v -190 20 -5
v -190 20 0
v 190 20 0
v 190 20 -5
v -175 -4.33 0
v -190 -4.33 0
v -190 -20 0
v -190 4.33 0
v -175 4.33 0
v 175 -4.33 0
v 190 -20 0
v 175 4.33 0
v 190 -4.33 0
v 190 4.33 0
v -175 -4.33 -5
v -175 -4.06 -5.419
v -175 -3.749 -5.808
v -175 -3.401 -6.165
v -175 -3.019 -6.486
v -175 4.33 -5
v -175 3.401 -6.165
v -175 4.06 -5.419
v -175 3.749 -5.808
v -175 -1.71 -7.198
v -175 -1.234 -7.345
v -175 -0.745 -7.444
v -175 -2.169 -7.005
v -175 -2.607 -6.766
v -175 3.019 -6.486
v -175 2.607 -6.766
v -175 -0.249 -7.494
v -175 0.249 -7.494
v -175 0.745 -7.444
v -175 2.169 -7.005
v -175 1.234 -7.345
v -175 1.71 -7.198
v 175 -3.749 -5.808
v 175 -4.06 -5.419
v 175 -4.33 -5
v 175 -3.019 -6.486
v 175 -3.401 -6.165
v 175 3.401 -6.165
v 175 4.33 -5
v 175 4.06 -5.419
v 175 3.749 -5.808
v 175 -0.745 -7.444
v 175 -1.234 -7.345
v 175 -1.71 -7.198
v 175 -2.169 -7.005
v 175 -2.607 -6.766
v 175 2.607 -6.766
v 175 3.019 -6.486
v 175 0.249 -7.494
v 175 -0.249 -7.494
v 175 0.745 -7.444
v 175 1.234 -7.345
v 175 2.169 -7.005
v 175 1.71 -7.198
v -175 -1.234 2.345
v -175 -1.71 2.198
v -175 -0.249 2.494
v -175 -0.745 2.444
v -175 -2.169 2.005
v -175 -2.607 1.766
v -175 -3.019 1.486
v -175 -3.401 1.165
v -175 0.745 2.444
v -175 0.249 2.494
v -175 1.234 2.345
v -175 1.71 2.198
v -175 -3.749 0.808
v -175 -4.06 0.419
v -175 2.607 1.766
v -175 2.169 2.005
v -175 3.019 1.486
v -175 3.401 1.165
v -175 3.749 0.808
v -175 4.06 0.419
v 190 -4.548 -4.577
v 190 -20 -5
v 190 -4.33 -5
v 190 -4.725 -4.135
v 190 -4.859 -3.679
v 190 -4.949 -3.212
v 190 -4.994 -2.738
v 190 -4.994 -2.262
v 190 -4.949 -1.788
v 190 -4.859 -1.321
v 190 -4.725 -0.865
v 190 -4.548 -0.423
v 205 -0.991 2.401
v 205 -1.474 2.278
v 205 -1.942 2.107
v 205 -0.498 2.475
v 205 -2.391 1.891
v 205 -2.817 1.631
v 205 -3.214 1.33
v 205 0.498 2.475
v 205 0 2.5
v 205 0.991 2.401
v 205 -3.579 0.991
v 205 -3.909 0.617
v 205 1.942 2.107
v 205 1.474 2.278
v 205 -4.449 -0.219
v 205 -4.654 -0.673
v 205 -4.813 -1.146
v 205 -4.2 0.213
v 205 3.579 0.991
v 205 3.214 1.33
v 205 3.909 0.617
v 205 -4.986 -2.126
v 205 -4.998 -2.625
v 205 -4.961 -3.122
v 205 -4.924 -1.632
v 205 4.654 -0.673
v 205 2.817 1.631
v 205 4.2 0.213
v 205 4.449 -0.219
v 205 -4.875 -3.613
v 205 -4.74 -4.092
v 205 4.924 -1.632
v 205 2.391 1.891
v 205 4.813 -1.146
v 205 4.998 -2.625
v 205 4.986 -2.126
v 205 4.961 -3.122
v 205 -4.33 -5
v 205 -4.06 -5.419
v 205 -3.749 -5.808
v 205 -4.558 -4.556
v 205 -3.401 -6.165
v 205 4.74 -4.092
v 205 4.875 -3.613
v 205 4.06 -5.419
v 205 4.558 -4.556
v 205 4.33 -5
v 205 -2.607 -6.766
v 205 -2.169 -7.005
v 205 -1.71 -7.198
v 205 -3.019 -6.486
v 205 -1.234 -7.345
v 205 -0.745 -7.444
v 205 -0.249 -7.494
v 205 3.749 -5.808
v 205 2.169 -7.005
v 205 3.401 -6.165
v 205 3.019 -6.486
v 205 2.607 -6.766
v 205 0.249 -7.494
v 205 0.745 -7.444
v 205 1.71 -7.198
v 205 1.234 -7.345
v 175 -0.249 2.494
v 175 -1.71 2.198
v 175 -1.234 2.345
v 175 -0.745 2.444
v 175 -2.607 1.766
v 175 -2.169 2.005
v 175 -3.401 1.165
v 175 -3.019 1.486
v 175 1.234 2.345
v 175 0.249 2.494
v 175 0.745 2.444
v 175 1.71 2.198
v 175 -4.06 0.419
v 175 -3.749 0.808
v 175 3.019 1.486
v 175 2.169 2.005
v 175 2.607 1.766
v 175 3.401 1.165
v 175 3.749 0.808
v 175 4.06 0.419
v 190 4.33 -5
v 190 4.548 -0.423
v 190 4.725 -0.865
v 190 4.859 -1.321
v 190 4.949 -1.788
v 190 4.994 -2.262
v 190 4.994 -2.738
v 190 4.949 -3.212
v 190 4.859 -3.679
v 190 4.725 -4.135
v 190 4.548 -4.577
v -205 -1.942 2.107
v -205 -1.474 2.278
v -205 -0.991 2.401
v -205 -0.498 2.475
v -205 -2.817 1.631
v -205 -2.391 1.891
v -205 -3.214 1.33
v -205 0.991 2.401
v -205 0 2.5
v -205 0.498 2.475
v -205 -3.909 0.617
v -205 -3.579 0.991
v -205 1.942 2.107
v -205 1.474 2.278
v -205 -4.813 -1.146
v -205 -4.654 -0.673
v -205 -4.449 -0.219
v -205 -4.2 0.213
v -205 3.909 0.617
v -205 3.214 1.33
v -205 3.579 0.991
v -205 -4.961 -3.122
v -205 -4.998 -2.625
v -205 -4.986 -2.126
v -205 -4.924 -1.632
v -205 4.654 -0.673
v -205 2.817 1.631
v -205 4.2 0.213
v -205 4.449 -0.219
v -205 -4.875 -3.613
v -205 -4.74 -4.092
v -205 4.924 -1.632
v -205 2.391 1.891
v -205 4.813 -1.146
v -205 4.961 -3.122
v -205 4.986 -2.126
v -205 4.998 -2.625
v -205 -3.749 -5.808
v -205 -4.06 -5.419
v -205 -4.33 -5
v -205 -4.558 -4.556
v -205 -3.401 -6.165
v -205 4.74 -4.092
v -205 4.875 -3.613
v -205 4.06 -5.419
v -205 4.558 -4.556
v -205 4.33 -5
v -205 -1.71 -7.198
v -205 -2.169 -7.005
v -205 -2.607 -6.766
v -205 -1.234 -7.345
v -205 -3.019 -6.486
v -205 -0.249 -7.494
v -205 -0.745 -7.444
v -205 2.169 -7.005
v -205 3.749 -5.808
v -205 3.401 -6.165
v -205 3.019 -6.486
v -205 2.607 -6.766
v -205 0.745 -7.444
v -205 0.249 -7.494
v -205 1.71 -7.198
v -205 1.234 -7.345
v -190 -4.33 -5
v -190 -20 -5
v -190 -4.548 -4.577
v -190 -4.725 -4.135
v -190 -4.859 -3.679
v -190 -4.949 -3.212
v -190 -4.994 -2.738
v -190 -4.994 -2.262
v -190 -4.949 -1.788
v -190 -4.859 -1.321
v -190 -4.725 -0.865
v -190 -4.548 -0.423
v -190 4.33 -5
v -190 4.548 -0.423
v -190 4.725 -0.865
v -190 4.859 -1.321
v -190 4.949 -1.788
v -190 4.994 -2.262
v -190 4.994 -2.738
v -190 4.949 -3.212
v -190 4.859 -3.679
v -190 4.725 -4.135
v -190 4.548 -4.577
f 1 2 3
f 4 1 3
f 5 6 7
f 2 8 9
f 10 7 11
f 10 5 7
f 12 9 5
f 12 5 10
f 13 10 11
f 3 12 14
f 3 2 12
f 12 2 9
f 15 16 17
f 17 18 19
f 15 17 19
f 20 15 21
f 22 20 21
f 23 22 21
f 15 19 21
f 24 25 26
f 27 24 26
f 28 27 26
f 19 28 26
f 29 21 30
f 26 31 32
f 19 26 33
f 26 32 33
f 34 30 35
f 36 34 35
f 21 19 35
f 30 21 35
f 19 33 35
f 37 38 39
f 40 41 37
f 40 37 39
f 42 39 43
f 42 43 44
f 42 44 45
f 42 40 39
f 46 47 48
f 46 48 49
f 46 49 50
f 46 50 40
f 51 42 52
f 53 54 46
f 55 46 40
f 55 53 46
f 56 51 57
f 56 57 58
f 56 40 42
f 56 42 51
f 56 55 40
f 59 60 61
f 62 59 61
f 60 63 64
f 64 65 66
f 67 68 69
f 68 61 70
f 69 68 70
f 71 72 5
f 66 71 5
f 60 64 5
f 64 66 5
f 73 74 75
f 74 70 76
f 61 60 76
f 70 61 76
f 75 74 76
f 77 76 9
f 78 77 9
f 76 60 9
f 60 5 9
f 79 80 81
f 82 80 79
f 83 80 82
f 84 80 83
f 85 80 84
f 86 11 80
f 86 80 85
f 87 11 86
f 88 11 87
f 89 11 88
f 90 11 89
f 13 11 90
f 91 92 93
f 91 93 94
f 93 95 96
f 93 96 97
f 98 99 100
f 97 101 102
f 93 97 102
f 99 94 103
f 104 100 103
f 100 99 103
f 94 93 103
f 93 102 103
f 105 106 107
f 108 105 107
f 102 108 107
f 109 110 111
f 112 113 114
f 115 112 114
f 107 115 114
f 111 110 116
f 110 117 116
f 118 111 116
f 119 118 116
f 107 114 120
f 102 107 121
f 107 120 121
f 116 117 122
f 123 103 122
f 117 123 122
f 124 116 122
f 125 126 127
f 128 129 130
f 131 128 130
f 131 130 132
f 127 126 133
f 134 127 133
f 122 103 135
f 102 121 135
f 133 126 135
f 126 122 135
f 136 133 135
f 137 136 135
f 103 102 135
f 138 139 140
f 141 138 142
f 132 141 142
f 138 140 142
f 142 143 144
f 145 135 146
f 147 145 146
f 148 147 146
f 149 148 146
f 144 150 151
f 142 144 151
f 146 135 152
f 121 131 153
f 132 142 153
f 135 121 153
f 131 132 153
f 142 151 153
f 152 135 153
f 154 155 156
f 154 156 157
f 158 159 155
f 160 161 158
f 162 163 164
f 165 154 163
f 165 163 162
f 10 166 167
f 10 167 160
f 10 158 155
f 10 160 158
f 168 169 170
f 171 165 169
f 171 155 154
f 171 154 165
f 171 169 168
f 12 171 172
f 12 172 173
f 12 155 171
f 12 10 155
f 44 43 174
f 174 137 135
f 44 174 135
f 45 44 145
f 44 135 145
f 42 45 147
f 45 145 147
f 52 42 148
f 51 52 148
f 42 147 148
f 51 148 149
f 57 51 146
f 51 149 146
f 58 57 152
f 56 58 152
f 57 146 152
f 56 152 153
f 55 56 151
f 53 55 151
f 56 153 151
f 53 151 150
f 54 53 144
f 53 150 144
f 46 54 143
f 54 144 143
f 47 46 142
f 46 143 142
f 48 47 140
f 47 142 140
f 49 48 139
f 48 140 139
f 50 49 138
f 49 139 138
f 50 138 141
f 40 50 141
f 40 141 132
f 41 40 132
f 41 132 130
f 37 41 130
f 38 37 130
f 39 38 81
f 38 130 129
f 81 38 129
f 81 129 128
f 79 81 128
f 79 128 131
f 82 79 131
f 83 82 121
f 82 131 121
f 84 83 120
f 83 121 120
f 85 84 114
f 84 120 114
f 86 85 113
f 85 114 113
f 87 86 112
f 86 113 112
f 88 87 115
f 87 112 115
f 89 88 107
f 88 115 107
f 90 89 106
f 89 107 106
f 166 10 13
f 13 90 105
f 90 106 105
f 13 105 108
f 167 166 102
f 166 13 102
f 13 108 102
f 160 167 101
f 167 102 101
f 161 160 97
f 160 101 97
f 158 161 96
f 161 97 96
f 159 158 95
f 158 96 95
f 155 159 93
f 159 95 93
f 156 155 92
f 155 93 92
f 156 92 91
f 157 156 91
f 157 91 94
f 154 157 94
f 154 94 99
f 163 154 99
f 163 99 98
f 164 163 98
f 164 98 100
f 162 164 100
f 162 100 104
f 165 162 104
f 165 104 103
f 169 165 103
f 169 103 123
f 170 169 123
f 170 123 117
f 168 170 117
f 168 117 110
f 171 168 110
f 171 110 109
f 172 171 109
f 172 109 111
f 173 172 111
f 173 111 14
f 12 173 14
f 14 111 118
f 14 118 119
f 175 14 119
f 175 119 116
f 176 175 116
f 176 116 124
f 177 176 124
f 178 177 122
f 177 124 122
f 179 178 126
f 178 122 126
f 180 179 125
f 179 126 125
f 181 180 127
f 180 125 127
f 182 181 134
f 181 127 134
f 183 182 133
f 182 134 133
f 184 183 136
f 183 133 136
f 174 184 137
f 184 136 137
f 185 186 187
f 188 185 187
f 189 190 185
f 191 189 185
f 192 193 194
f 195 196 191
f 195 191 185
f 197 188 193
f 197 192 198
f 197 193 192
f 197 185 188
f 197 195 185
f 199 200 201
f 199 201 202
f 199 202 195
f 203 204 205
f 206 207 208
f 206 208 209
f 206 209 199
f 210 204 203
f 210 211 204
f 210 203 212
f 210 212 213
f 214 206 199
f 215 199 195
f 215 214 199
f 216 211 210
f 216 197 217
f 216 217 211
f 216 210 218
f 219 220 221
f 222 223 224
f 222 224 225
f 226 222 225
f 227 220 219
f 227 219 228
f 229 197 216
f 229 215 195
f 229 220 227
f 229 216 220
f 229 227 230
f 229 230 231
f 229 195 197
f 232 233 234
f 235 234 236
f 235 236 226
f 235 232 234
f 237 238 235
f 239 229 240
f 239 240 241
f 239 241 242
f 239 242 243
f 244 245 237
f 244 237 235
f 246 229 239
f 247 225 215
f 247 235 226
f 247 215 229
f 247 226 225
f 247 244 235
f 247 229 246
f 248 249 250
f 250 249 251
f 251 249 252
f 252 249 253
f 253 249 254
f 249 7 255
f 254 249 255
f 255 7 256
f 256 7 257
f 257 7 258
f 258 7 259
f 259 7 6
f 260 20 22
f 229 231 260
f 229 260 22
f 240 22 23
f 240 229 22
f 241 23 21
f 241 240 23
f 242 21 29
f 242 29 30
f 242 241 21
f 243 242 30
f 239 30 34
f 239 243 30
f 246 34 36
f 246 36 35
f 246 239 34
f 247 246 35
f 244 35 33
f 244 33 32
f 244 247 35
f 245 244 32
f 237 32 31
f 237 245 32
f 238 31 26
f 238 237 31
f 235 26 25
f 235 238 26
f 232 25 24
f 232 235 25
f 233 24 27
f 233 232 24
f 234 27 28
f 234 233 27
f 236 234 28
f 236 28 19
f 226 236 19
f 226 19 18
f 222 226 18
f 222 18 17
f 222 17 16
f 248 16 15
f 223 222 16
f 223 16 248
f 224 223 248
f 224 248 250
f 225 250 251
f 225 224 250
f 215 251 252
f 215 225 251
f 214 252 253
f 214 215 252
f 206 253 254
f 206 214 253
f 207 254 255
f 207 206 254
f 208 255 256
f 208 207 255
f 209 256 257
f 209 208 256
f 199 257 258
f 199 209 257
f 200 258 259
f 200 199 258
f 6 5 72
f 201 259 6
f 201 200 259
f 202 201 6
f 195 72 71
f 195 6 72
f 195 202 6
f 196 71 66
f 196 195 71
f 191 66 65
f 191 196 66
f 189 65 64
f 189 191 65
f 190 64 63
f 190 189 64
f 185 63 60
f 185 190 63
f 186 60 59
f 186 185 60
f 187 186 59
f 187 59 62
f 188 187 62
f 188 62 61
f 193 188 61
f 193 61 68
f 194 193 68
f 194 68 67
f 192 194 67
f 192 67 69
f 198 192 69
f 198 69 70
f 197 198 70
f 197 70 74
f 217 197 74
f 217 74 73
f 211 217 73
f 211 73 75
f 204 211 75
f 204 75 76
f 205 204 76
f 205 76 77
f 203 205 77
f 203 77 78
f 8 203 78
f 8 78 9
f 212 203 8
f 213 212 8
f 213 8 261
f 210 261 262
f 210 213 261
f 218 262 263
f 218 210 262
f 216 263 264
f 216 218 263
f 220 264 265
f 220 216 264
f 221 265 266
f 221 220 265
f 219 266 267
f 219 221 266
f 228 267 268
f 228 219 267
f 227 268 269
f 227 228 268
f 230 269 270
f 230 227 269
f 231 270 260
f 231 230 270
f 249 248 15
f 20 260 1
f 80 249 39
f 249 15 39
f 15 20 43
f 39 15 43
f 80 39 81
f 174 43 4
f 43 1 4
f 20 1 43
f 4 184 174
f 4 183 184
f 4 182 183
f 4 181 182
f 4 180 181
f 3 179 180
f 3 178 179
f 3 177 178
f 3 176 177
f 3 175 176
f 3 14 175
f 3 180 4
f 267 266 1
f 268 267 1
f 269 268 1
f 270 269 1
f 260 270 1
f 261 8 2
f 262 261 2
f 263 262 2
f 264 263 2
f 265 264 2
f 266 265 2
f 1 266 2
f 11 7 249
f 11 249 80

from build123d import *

# Parameters (mm, degrees)
SKETCH1_W           = 380
SKETCH1_H           = 40
BOSS_EXTRUDE1_DEPTH = 5
SKETCH2_R           = 5
BOSS_EXTRUDE2_DEPTH = 15


with BuildPart() as part:
    # Sketch1 → Boss-Extrude1 (new body)
    with BuildSketch(Plane.XY):
        Rectangle(SKETCH1_W, SKETCH1_H)
    extrude(amount=-BOSS_EXTRUDE1_DEPTH)

    # Sketch2 → Boss-Extrude2 (add, symmetric)
    with BuildSketch(Plane.ZY.offset(190)):
        with Locations(Location((-2.5, 0, 0), (0, 0, 120))):
            Circle(SKETCH2_R)
    boss_extrude2 = extrude(amount=BOSS_EXTRUDE2_DEPTH, both=True)

    # Mirror1: Boss-Extrude2 across plane
    add(boss_extrude2.mirror(Plane(origin=(0, 0, 0), x_dir=(0, 0, 1), z_dir=(1, 0, 0))))


solid = part.part
